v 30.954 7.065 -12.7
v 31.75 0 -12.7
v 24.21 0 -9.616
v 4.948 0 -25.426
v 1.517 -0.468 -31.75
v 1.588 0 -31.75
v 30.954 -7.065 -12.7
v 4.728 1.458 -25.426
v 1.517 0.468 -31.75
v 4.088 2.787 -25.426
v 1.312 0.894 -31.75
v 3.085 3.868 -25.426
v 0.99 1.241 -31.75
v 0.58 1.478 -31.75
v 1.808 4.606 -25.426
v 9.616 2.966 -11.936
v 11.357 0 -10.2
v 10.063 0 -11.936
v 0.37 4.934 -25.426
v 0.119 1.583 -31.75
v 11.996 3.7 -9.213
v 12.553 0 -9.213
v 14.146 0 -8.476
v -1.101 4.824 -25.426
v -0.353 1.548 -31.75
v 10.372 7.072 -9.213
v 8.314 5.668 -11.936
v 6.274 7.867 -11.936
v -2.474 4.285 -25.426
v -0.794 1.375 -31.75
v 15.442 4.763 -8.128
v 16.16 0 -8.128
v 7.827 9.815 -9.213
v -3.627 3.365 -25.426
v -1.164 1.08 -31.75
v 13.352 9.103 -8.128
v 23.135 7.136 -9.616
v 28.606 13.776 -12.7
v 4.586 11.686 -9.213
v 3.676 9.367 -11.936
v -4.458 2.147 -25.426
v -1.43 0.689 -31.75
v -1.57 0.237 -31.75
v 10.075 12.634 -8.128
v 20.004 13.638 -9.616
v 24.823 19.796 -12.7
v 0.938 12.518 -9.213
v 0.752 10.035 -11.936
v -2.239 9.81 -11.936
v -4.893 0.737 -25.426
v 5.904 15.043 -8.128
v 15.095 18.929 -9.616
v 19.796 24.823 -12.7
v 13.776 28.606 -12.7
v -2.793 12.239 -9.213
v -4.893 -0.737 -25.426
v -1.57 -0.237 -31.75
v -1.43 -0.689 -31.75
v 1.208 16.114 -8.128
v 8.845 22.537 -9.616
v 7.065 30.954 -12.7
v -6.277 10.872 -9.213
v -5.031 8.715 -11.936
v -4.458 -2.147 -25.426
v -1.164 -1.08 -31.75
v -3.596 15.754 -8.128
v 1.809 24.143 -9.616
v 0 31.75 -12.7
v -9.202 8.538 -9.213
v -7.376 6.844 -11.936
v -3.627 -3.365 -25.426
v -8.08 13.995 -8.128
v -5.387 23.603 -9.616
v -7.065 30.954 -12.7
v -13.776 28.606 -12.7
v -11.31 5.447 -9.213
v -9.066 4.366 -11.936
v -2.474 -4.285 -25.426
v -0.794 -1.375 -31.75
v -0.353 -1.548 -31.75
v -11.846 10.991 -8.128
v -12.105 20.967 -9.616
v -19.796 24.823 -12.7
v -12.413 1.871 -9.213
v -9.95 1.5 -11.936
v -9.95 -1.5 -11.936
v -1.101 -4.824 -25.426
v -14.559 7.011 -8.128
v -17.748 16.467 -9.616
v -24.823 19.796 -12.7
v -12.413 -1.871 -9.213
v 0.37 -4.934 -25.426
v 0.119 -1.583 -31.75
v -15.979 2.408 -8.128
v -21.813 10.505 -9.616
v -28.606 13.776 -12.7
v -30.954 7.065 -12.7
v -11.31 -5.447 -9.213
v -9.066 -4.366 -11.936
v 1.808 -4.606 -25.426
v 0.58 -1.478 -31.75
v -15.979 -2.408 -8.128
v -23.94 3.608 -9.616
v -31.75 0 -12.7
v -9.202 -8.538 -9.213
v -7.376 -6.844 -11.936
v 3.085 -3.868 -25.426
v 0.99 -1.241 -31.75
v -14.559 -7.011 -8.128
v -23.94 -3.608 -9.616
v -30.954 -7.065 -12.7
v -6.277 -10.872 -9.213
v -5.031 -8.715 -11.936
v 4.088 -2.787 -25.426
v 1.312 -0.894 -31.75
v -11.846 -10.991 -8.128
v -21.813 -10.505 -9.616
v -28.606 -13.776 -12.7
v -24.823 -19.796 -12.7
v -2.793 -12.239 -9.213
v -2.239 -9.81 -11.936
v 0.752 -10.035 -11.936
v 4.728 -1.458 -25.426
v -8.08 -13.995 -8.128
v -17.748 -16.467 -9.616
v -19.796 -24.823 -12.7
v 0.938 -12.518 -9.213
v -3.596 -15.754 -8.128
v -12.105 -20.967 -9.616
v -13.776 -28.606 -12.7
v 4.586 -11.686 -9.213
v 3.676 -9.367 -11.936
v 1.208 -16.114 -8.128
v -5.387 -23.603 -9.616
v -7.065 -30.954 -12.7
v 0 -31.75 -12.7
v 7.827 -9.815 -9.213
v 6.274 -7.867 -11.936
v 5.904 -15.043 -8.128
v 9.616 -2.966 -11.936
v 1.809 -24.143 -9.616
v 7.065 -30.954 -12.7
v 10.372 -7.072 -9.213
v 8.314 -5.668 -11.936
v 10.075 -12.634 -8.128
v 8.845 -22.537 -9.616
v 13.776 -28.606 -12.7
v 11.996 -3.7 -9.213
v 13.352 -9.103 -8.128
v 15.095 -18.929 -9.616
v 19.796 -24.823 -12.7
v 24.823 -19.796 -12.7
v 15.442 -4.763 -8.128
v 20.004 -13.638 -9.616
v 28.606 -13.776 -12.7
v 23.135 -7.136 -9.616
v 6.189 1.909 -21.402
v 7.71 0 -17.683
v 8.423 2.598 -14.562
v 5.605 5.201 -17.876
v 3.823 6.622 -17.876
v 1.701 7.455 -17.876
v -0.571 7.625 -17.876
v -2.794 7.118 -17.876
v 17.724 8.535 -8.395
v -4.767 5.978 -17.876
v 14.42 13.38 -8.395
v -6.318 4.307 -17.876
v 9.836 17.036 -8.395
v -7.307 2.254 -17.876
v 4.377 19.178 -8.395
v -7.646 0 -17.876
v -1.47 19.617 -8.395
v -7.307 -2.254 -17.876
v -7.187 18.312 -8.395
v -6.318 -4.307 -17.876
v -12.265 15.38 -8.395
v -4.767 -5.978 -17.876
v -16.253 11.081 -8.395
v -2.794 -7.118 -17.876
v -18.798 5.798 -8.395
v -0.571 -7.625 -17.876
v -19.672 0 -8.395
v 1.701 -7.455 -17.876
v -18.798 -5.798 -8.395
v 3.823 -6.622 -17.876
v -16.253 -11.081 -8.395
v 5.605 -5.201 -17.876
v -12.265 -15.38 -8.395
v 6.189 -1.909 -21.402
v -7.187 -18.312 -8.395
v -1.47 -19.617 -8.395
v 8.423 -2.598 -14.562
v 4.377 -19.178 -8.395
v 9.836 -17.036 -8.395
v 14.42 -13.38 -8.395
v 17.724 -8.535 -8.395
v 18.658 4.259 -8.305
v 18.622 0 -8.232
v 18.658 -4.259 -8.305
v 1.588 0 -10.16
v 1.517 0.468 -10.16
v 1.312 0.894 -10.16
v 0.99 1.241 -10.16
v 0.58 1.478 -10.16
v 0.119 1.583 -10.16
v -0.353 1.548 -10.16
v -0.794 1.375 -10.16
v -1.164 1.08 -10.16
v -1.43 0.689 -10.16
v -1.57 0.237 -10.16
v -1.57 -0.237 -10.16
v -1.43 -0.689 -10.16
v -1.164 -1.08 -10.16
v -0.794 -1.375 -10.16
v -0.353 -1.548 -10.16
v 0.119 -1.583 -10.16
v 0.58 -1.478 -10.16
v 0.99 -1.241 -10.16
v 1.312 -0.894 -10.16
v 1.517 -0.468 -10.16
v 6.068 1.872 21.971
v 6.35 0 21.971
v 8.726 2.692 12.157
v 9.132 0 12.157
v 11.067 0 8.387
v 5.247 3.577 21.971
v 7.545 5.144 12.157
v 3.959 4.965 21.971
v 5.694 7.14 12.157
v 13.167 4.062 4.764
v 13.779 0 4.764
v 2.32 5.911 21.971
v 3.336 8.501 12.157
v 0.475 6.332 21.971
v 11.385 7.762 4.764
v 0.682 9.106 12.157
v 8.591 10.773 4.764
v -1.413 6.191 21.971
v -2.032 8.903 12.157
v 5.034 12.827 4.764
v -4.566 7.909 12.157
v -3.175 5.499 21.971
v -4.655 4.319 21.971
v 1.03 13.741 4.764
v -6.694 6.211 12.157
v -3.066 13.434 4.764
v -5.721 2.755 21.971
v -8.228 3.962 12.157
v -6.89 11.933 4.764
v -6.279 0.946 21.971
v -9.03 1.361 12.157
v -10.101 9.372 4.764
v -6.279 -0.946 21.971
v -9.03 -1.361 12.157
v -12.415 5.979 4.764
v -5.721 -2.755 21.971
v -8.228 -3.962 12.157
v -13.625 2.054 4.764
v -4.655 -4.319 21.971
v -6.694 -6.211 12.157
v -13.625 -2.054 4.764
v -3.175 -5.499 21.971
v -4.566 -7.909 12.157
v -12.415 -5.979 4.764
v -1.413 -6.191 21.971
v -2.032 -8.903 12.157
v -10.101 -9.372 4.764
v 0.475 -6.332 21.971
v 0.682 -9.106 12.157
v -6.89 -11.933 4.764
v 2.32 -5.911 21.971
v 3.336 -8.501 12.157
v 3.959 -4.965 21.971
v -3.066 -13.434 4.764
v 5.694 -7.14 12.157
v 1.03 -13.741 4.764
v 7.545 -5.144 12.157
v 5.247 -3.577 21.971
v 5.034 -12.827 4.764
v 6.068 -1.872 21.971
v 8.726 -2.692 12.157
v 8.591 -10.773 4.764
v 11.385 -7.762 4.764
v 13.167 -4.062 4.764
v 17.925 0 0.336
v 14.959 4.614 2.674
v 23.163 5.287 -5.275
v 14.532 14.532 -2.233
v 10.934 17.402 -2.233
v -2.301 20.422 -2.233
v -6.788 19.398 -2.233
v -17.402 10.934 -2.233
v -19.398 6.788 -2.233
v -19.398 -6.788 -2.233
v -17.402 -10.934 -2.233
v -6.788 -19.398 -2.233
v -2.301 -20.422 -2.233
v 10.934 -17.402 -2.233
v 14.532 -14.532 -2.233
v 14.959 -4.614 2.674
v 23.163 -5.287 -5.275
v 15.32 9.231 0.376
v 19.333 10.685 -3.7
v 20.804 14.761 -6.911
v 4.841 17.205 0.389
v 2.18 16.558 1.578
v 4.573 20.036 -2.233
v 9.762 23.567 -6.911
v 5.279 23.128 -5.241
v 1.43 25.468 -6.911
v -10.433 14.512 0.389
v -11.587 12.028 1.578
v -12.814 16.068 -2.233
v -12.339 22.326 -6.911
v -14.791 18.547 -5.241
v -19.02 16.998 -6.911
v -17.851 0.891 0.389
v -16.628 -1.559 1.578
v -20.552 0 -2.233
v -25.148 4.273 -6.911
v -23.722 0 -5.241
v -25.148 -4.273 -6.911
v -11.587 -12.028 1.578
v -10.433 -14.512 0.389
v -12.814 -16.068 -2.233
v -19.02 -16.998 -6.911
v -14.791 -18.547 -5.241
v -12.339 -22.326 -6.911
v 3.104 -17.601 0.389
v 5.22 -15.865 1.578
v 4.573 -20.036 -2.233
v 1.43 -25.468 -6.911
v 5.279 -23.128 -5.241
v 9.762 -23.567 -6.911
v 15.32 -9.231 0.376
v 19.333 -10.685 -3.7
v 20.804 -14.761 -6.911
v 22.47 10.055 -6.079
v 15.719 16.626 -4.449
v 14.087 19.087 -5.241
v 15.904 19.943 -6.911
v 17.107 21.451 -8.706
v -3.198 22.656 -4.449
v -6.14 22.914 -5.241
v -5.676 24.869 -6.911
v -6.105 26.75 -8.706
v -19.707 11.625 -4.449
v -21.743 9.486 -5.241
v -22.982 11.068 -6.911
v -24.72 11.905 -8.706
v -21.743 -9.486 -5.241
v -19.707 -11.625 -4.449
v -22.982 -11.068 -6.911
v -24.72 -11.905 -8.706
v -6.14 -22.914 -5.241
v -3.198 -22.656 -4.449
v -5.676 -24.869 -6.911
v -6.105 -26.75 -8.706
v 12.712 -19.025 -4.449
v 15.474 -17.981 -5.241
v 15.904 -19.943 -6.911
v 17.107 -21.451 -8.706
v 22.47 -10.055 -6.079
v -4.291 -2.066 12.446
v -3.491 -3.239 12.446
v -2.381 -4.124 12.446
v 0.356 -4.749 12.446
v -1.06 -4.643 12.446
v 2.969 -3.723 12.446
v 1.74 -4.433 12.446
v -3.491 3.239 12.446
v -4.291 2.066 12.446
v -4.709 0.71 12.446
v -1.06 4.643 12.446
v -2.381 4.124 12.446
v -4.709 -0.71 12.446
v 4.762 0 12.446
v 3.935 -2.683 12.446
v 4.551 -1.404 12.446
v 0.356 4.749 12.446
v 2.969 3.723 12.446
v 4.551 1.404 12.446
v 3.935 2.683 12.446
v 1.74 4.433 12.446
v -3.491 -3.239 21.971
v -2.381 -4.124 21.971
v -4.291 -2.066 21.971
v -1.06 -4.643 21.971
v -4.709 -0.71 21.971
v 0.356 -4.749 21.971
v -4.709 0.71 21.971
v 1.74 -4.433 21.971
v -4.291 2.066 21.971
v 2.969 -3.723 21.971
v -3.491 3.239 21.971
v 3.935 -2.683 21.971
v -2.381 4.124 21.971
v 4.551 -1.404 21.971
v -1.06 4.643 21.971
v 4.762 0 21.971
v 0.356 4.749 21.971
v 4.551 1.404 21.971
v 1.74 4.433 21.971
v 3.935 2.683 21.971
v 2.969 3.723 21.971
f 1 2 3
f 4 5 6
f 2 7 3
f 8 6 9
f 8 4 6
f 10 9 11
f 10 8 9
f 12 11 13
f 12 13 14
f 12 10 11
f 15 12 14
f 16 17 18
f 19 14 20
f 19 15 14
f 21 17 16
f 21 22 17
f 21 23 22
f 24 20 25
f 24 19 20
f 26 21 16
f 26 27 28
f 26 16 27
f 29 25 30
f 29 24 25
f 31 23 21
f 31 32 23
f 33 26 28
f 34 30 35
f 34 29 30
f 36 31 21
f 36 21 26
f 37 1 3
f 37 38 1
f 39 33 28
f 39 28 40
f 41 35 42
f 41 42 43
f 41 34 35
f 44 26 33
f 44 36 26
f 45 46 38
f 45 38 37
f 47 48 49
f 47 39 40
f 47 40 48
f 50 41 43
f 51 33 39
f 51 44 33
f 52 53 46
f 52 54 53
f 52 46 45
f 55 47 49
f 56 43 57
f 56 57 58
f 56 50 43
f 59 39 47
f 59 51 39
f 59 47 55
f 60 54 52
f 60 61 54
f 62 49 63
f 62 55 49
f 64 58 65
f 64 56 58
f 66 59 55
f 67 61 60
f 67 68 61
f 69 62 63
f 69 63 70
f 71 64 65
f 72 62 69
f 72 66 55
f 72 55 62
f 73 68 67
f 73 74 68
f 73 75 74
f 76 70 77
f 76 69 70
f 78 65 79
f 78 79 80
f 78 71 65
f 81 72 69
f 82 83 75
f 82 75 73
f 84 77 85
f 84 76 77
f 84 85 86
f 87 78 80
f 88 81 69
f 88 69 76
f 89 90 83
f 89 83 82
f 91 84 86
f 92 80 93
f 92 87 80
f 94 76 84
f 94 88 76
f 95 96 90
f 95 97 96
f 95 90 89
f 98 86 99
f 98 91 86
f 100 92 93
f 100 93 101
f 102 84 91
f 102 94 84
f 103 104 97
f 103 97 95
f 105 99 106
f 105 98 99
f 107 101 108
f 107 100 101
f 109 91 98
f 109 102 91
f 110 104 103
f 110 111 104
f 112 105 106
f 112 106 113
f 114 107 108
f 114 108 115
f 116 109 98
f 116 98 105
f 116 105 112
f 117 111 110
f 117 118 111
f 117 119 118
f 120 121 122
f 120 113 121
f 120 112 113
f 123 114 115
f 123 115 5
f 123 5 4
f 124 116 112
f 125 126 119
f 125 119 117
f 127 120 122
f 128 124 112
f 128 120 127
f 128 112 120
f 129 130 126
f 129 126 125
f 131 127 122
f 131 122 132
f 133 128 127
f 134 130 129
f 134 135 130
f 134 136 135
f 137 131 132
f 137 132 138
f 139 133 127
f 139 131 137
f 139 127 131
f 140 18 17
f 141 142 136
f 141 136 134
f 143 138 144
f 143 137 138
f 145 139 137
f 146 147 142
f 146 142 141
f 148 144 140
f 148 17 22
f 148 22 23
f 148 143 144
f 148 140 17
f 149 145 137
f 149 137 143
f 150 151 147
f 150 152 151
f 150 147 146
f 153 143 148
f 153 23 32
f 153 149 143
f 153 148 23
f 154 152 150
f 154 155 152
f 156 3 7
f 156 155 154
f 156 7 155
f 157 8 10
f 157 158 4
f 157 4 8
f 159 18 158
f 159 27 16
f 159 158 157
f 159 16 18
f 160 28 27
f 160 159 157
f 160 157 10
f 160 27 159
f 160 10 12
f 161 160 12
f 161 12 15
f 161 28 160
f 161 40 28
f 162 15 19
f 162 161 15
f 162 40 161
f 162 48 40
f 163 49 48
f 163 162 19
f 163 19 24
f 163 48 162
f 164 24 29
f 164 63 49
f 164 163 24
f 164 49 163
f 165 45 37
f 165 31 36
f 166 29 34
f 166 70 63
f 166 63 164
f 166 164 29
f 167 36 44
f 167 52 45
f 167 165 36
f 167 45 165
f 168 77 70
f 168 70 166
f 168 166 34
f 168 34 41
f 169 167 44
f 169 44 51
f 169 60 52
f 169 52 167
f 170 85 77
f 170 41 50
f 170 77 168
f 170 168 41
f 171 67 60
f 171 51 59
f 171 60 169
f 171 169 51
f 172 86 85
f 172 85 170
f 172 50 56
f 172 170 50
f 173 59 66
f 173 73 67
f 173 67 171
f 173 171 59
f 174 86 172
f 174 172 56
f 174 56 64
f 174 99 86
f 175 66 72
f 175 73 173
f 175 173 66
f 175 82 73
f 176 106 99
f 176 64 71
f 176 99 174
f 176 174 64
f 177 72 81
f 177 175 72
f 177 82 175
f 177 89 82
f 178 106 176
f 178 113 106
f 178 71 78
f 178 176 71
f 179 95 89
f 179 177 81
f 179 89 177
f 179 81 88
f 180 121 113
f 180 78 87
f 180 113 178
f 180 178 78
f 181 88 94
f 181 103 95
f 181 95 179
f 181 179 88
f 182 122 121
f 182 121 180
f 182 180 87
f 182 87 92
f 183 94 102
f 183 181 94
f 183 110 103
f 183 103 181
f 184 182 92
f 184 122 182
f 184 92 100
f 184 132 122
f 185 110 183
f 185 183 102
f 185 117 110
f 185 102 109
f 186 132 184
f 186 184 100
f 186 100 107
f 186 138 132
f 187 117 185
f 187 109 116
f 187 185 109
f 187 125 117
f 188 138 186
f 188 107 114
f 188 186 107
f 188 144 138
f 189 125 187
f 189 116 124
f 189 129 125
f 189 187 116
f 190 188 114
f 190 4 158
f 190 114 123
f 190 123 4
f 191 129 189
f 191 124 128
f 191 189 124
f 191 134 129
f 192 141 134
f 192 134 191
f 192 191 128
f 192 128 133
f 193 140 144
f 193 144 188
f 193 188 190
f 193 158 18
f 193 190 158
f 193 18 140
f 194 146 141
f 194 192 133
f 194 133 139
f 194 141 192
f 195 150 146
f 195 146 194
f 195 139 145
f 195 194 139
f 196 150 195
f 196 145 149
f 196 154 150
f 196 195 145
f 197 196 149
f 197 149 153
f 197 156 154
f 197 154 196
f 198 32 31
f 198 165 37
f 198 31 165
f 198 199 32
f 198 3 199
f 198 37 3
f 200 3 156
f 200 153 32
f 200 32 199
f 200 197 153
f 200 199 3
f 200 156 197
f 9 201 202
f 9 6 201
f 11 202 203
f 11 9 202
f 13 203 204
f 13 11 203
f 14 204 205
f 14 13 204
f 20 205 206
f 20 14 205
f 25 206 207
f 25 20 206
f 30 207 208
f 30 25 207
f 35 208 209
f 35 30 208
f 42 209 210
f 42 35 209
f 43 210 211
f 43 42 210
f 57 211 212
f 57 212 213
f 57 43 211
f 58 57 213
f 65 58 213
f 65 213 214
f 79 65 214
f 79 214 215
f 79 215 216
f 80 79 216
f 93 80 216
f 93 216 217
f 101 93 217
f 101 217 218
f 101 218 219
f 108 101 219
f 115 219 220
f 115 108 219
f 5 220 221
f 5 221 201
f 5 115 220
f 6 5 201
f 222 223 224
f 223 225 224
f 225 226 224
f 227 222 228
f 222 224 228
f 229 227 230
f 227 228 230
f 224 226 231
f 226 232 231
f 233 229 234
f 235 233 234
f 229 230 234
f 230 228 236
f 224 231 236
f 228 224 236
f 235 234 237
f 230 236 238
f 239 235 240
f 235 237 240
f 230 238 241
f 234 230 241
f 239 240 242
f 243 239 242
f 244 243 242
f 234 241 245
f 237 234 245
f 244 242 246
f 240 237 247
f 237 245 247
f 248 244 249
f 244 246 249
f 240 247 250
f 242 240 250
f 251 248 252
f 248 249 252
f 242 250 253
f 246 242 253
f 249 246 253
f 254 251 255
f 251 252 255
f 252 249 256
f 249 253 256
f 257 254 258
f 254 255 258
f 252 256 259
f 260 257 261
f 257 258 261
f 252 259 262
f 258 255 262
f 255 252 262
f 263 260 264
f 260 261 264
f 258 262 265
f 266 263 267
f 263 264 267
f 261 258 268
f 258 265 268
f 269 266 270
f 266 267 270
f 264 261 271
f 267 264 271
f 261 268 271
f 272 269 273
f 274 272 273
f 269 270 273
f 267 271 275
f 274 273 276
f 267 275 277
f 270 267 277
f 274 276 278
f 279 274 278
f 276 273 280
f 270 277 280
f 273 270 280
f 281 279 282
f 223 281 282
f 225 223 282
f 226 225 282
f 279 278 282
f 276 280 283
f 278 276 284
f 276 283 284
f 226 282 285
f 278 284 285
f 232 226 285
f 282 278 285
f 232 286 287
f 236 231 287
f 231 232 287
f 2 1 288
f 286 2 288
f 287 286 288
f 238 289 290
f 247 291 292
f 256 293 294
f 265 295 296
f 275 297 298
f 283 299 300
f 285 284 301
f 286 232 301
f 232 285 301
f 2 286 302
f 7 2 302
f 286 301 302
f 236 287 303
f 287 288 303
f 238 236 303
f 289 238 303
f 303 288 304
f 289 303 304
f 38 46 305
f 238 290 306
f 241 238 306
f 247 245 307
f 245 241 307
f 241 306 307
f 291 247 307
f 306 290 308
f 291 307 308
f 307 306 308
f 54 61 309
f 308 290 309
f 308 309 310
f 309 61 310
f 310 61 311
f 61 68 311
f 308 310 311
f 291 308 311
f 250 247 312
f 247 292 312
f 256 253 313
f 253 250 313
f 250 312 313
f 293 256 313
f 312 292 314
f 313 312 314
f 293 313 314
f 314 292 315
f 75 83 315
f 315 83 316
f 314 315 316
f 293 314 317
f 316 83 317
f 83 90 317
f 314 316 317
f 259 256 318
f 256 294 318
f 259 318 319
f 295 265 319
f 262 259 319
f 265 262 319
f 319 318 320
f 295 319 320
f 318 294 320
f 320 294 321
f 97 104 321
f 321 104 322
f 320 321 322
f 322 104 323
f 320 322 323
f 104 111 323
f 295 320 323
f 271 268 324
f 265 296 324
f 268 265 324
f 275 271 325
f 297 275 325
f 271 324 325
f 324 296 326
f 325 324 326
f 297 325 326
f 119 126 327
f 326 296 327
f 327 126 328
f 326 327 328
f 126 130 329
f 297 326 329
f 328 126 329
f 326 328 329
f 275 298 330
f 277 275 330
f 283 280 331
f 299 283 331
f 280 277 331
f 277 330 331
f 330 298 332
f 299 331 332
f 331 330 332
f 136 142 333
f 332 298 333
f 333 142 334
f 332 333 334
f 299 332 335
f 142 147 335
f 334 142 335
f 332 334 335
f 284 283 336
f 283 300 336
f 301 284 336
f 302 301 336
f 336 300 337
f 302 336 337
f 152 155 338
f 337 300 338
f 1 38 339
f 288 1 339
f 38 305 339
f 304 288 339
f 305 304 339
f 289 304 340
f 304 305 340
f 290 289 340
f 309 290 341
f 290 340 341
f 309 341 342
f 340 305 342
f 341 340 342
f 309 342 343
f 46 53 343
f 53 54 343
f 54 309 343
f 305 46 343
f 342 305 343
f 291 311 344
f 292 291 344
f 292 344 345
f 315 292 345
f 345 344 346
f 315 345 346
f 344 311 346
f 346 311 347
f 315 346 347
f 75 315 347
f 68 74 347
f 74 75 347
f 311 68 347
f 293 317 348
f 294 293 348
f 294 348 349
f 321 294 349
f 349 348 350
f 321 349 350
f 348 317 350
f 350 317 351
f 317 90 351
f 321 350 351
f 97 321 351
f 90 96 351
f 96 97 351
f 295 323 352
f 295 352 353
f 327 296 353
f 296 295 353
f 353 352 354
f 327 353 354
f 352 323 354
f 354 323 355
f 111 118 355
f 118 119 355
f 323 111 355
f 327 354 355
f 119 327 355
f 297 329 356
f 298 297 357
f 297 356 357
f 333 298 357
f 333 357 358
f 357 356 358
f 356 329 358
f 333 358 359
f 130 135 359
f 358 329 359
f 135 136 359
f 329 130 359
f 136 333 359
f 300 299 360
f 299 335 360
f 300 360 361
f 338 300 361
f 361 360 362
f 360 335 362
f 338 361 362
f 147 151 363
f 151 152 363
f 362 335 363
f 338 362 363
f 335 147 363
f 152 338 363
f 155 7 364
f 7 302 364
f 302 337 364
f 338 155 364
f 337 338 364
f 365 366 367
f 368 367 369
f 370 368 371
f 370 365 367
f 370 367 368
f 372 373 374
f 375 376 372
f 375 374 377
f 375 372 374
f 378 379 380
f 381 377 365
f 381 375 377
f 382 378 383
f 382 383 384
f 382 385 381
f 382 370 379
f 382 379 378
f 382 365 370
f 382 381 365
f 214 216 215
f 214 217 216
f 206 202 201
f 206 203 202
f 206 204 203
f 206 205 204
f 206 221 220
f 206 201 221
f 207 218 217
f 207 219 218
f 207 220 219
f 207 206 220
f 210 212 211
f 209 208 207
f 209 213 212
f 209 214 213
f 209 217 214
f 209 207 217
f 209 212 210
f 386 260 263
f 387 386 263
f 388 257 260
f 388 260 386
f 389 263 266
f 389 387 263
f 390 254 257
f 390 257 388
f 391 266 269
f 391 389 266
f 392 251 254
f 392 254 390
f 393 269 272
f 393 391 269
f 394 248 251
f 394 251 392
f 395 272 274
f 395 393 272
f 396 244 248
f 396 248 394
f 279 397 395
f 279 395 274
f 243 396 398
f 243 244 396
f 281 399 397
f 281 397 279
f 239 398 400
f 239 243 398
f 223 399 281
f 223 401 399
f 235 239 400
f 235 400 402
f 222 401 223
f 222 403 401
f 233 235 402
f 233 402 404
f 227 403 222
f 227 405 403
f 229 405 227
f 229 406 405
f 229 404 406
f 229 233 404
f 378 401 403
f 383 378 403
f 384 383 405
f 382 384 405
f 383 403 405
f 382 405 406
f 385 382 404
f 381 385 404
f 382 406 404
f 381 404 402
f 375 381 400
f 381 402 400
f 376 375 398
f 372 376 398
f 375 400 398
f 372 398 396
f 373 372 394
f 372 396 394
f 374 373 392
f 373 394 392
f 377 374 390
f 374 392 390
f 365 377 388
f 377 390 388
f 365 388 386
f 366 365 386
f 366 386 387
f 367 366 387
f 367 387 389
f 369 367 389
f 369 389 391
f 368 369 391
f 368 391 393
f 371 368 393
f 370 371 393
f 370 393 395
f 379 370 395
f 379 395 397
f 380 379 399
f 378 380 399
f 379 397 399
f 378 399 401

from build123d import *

# Parameters (mm, degrees)
F2_R     = 4.7625
F3_DEPTH = 9.525


with BuildPart() as f1:
    # F0 (on Front) → F1 (revolve)
    with BuildSketch(Plane.XZ):
        with BuildLine():
            add(Edge.make_bspline(
                [(1.5875, -31.75), (11.978928, -16.045667), (4.337432, 0), (31.75, -12.7)],
                knots=[0, 0, 0, 0, 35.674626, 35.674626, 35.674626, 35.674626], degree=3))
            add(Edge.make_bspline(
                [(6.35, 21.971), (9.779001, 7.630583), (9.779001, 7.630583), (31.75, -12.7)],
                knots=[0, 0, 0, 0, 42.97951, 42.97951, 42.97951, 42.97951], degree=3))
            Line((6.35, 21.971), (0, 21.971))
            Line((0, 21.971), (0, -10.16))
            Line((0, -10.16), (1.5875, -10.16))
            Line((1.5875, -10.16), (1.5875, -31.75))
        make_face()
    revolve(axis=Axis((0, 0, 0), (0, 0, 1)))

    # F2 (on face) → F3 (cut)
    with BuildSketch(Plane.XY.offset(21.971)):
        Circle(F2_R)
    extrude(amount=-F3_DEPTH, mode=Mode.SUBTRACT)


solid = f1.part
